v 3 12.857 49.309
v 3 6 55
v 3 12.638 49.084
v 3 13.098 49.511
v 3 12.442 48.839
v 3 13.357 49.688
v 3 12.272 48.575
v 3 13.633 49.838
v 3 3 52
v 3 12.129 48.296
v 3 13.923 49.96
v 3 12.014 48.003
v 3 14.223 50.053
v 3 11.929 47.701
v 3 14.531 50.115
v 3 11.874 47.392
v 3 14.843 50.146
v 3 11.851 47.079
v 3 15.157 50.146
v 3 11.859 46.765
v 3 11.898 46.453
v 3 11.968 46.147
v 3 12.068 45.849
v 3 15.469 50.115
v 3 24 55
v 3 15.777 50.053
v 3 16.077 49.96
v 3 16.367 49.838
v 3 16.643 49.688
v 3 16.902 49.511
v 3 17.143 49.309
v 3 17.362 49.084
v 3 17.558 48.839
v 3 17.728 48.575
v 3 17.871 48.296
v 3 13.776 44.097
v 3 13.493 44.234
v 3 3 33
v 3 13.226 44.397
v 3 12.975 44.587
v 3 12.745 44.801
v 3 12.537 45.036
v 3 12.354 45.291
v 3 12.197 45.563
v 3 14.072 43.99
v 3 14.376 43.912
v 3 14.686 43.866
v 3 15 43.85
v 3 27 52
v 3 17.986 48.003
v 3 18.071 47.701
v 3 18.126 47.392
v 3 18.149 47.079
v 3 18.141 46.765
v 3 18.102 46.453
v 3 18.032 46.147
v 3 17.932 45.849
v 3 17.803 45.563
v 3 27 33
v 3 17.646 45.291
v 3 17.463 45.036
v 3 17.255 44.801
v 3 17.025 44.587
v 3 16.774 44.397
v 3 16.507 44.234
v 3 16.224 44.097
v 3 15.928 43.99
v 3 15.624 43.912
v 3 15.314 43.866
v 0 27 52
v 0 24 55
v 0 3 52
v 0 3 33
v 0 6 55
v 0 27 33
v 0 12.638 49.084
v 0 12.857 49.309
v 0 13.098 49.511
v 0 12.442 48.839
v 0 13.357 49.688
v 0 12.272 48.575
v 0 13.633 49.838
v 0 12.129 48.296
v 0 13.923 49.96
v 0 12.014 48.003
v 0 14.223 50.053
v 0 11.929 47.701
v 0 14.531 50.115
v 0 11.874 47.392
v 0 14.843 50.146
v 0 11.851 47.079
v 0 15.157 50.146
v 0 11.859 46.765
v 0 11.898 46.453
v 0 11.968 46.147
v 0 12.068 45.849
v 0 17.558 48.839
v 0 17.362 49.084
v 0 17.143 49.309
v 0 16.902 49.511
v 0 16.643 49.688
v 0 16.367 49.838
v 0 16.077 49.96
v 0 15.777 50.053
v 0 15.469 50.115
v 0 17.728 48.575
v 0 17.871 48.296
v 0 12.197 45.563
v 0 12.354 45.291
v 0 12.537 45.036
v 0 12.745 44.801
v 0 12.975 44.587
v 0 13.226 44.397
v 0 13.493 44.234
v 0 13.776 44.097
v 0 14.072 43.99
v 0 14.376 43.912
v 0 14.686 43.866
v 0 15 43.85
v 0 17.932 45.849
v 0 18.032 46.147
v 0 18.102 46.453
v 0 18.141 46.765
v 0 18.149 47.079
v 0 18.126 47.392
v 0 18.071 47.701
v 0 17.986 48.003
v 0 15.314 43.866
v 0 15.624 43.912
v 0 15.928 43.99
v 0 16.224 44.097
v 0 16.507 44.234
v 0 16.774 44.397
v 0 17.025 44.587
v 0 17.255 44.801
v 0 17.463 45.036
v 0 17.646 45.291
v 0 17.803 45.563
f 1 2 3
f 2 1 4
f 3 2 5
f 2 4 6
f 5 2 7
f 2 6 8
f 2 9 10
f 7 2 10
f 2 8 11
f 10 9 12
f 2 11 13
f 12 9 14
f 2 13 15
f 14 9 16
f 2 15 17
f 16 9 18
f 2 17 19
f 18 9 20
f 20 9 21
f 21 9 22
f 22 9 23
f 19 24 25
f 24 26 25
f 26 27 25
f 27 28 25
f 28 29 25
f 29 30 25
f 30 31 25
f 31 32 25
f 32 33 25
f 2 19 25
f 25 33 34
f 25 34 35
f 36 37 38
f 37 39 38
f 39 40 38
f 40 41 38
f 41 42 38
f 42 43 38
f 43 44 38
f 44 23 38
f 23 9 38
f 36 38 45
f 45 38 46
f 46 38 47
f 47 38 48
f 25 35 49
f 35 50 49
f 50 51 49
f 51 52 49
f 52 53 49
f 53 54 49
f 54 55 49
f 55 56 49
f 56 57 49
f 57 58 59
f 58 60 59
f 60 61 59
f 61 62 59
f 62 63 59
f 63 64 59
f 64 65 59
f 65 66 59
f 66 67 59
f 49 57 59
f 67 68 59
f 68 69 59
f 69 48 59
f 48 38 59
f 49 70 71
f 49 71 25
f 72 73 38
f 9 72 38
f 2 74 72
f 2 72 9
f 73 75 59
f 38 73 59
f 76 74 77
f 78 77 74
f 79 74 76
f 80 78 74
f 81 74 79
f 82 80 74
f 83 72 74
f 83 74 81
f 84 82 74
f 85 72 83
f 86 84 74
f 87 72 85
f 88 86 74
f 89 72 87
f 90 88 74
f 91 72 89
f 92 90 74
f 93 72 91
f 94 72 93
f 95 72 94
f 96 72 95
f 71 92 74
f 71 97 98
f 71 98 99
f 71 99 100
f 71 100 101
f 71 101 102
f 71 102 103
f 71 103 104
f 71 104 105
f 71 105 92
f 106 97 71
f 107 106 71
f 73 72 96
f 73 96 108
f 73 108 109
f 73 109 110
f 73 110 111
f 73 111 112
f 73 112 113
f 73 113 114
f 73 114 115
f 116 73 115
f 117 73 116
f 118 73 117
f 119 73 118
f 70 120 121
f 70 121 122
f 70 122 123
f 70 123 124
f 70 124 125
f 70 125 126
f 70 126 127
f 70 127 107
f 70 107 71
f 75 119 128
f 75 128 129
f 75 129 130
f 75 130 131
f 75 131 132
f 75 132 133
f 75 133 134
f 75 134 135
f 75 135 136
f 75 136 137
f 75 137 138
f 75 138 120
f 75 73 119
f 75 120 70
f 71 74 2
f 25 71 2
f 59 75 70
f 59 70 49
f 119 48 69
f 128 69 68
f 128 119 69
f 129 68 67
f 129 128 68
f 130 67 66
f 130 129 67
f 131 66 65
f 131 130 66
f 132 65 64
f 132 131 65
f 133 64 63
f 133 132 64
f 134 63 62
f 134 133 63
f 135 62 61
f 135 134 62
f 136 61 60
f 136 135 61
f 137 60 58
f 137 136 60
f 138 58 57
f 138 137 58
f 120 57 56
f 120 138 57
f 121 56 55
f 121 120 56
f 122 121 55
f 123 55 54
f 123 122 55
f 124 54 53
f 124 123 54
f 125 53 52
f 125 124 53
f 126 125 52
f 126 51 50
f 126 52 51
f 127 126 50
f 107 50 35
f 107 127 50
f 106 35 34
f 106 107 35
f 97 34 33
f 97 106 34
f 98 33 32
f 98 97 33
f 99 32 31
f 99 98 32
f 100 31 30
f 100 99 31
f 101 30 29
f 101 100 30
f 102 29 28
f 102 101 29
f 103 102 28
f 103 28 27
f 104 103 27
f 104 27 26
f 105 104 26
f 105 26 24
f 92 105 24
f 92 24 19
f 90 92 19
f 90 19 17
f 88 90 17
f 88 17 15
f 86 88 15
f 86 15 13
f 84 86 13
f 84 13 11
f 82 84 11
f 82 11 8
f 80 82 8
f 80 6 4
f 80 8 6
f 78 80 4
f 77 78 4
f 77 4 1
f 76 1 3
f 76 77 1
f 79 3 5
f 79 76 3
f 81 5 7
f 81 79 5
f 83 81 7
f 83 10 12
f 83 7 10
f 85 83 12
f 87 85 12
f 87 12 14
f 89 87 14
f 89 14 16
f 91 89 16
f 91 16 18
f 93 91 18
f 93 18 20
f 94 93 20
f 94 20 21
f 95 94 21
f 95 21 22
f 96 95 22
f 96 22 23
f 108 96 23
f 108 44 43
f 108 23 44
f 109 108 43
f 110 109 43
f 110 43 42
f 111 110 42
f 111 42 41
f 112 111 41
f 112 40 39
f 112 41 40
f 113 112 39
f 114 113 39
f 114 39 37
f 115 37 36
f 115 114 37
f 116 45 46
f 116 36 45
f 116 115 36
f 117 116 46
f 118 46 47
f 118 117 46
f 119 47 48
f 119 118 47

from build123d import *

# Parameters (mm, degrees)
CYLINDER001_R      = 3.15
CYLINDER001_DEPTH  = 10
BOX010_W           = 3
BOX010_H           = 24
BOX010_DEPTH       = 22
CHAMFER020014_SIZE = 3


with BuildPart() as cylinder001:
    # Cylinder001 → Cylinder001 (new body)
    with BuildSketch(Plane(origin=(0, 15, 60), x_dir=(0, 0, -1), z_dir=(1, 0, 0))):
        Circle(CYLINDER001_R)
    extrude(amount=CYLINDER001_DEPTH)


with BuildPart() as cut:
    # Box010 → Box010 (new body)
    with BuildSketch(Plane(origin=(0, 3, 46), x_dir=(1, 0, 0), z_dir=(0, 0, 1))):
        with Locations((1.5, 12)):
            Rectangle(BOX010_W, BOX010_H)
    extrude(amount=BOX010_DEPTH)

    # Chamfer020014
    chamfer020014_edges = [cut.edges().sort_by_distance(p)[0] for p in [
        (1.5, 3, 68),
        (1.5, 27, 68),
    ]]
    chamfer(chamfer020014_edges, length=CHAMFER020014_SIZE)

    # Cut: cut Cylinder001
    add(cylinder001.part, mode=Mode.SUBTRACT)


with BuildPart() as cut_1:
    # Cut placement: moved
    add(cut.part.moved(Location((0, 0, -13))))


solid = cut_1.part
